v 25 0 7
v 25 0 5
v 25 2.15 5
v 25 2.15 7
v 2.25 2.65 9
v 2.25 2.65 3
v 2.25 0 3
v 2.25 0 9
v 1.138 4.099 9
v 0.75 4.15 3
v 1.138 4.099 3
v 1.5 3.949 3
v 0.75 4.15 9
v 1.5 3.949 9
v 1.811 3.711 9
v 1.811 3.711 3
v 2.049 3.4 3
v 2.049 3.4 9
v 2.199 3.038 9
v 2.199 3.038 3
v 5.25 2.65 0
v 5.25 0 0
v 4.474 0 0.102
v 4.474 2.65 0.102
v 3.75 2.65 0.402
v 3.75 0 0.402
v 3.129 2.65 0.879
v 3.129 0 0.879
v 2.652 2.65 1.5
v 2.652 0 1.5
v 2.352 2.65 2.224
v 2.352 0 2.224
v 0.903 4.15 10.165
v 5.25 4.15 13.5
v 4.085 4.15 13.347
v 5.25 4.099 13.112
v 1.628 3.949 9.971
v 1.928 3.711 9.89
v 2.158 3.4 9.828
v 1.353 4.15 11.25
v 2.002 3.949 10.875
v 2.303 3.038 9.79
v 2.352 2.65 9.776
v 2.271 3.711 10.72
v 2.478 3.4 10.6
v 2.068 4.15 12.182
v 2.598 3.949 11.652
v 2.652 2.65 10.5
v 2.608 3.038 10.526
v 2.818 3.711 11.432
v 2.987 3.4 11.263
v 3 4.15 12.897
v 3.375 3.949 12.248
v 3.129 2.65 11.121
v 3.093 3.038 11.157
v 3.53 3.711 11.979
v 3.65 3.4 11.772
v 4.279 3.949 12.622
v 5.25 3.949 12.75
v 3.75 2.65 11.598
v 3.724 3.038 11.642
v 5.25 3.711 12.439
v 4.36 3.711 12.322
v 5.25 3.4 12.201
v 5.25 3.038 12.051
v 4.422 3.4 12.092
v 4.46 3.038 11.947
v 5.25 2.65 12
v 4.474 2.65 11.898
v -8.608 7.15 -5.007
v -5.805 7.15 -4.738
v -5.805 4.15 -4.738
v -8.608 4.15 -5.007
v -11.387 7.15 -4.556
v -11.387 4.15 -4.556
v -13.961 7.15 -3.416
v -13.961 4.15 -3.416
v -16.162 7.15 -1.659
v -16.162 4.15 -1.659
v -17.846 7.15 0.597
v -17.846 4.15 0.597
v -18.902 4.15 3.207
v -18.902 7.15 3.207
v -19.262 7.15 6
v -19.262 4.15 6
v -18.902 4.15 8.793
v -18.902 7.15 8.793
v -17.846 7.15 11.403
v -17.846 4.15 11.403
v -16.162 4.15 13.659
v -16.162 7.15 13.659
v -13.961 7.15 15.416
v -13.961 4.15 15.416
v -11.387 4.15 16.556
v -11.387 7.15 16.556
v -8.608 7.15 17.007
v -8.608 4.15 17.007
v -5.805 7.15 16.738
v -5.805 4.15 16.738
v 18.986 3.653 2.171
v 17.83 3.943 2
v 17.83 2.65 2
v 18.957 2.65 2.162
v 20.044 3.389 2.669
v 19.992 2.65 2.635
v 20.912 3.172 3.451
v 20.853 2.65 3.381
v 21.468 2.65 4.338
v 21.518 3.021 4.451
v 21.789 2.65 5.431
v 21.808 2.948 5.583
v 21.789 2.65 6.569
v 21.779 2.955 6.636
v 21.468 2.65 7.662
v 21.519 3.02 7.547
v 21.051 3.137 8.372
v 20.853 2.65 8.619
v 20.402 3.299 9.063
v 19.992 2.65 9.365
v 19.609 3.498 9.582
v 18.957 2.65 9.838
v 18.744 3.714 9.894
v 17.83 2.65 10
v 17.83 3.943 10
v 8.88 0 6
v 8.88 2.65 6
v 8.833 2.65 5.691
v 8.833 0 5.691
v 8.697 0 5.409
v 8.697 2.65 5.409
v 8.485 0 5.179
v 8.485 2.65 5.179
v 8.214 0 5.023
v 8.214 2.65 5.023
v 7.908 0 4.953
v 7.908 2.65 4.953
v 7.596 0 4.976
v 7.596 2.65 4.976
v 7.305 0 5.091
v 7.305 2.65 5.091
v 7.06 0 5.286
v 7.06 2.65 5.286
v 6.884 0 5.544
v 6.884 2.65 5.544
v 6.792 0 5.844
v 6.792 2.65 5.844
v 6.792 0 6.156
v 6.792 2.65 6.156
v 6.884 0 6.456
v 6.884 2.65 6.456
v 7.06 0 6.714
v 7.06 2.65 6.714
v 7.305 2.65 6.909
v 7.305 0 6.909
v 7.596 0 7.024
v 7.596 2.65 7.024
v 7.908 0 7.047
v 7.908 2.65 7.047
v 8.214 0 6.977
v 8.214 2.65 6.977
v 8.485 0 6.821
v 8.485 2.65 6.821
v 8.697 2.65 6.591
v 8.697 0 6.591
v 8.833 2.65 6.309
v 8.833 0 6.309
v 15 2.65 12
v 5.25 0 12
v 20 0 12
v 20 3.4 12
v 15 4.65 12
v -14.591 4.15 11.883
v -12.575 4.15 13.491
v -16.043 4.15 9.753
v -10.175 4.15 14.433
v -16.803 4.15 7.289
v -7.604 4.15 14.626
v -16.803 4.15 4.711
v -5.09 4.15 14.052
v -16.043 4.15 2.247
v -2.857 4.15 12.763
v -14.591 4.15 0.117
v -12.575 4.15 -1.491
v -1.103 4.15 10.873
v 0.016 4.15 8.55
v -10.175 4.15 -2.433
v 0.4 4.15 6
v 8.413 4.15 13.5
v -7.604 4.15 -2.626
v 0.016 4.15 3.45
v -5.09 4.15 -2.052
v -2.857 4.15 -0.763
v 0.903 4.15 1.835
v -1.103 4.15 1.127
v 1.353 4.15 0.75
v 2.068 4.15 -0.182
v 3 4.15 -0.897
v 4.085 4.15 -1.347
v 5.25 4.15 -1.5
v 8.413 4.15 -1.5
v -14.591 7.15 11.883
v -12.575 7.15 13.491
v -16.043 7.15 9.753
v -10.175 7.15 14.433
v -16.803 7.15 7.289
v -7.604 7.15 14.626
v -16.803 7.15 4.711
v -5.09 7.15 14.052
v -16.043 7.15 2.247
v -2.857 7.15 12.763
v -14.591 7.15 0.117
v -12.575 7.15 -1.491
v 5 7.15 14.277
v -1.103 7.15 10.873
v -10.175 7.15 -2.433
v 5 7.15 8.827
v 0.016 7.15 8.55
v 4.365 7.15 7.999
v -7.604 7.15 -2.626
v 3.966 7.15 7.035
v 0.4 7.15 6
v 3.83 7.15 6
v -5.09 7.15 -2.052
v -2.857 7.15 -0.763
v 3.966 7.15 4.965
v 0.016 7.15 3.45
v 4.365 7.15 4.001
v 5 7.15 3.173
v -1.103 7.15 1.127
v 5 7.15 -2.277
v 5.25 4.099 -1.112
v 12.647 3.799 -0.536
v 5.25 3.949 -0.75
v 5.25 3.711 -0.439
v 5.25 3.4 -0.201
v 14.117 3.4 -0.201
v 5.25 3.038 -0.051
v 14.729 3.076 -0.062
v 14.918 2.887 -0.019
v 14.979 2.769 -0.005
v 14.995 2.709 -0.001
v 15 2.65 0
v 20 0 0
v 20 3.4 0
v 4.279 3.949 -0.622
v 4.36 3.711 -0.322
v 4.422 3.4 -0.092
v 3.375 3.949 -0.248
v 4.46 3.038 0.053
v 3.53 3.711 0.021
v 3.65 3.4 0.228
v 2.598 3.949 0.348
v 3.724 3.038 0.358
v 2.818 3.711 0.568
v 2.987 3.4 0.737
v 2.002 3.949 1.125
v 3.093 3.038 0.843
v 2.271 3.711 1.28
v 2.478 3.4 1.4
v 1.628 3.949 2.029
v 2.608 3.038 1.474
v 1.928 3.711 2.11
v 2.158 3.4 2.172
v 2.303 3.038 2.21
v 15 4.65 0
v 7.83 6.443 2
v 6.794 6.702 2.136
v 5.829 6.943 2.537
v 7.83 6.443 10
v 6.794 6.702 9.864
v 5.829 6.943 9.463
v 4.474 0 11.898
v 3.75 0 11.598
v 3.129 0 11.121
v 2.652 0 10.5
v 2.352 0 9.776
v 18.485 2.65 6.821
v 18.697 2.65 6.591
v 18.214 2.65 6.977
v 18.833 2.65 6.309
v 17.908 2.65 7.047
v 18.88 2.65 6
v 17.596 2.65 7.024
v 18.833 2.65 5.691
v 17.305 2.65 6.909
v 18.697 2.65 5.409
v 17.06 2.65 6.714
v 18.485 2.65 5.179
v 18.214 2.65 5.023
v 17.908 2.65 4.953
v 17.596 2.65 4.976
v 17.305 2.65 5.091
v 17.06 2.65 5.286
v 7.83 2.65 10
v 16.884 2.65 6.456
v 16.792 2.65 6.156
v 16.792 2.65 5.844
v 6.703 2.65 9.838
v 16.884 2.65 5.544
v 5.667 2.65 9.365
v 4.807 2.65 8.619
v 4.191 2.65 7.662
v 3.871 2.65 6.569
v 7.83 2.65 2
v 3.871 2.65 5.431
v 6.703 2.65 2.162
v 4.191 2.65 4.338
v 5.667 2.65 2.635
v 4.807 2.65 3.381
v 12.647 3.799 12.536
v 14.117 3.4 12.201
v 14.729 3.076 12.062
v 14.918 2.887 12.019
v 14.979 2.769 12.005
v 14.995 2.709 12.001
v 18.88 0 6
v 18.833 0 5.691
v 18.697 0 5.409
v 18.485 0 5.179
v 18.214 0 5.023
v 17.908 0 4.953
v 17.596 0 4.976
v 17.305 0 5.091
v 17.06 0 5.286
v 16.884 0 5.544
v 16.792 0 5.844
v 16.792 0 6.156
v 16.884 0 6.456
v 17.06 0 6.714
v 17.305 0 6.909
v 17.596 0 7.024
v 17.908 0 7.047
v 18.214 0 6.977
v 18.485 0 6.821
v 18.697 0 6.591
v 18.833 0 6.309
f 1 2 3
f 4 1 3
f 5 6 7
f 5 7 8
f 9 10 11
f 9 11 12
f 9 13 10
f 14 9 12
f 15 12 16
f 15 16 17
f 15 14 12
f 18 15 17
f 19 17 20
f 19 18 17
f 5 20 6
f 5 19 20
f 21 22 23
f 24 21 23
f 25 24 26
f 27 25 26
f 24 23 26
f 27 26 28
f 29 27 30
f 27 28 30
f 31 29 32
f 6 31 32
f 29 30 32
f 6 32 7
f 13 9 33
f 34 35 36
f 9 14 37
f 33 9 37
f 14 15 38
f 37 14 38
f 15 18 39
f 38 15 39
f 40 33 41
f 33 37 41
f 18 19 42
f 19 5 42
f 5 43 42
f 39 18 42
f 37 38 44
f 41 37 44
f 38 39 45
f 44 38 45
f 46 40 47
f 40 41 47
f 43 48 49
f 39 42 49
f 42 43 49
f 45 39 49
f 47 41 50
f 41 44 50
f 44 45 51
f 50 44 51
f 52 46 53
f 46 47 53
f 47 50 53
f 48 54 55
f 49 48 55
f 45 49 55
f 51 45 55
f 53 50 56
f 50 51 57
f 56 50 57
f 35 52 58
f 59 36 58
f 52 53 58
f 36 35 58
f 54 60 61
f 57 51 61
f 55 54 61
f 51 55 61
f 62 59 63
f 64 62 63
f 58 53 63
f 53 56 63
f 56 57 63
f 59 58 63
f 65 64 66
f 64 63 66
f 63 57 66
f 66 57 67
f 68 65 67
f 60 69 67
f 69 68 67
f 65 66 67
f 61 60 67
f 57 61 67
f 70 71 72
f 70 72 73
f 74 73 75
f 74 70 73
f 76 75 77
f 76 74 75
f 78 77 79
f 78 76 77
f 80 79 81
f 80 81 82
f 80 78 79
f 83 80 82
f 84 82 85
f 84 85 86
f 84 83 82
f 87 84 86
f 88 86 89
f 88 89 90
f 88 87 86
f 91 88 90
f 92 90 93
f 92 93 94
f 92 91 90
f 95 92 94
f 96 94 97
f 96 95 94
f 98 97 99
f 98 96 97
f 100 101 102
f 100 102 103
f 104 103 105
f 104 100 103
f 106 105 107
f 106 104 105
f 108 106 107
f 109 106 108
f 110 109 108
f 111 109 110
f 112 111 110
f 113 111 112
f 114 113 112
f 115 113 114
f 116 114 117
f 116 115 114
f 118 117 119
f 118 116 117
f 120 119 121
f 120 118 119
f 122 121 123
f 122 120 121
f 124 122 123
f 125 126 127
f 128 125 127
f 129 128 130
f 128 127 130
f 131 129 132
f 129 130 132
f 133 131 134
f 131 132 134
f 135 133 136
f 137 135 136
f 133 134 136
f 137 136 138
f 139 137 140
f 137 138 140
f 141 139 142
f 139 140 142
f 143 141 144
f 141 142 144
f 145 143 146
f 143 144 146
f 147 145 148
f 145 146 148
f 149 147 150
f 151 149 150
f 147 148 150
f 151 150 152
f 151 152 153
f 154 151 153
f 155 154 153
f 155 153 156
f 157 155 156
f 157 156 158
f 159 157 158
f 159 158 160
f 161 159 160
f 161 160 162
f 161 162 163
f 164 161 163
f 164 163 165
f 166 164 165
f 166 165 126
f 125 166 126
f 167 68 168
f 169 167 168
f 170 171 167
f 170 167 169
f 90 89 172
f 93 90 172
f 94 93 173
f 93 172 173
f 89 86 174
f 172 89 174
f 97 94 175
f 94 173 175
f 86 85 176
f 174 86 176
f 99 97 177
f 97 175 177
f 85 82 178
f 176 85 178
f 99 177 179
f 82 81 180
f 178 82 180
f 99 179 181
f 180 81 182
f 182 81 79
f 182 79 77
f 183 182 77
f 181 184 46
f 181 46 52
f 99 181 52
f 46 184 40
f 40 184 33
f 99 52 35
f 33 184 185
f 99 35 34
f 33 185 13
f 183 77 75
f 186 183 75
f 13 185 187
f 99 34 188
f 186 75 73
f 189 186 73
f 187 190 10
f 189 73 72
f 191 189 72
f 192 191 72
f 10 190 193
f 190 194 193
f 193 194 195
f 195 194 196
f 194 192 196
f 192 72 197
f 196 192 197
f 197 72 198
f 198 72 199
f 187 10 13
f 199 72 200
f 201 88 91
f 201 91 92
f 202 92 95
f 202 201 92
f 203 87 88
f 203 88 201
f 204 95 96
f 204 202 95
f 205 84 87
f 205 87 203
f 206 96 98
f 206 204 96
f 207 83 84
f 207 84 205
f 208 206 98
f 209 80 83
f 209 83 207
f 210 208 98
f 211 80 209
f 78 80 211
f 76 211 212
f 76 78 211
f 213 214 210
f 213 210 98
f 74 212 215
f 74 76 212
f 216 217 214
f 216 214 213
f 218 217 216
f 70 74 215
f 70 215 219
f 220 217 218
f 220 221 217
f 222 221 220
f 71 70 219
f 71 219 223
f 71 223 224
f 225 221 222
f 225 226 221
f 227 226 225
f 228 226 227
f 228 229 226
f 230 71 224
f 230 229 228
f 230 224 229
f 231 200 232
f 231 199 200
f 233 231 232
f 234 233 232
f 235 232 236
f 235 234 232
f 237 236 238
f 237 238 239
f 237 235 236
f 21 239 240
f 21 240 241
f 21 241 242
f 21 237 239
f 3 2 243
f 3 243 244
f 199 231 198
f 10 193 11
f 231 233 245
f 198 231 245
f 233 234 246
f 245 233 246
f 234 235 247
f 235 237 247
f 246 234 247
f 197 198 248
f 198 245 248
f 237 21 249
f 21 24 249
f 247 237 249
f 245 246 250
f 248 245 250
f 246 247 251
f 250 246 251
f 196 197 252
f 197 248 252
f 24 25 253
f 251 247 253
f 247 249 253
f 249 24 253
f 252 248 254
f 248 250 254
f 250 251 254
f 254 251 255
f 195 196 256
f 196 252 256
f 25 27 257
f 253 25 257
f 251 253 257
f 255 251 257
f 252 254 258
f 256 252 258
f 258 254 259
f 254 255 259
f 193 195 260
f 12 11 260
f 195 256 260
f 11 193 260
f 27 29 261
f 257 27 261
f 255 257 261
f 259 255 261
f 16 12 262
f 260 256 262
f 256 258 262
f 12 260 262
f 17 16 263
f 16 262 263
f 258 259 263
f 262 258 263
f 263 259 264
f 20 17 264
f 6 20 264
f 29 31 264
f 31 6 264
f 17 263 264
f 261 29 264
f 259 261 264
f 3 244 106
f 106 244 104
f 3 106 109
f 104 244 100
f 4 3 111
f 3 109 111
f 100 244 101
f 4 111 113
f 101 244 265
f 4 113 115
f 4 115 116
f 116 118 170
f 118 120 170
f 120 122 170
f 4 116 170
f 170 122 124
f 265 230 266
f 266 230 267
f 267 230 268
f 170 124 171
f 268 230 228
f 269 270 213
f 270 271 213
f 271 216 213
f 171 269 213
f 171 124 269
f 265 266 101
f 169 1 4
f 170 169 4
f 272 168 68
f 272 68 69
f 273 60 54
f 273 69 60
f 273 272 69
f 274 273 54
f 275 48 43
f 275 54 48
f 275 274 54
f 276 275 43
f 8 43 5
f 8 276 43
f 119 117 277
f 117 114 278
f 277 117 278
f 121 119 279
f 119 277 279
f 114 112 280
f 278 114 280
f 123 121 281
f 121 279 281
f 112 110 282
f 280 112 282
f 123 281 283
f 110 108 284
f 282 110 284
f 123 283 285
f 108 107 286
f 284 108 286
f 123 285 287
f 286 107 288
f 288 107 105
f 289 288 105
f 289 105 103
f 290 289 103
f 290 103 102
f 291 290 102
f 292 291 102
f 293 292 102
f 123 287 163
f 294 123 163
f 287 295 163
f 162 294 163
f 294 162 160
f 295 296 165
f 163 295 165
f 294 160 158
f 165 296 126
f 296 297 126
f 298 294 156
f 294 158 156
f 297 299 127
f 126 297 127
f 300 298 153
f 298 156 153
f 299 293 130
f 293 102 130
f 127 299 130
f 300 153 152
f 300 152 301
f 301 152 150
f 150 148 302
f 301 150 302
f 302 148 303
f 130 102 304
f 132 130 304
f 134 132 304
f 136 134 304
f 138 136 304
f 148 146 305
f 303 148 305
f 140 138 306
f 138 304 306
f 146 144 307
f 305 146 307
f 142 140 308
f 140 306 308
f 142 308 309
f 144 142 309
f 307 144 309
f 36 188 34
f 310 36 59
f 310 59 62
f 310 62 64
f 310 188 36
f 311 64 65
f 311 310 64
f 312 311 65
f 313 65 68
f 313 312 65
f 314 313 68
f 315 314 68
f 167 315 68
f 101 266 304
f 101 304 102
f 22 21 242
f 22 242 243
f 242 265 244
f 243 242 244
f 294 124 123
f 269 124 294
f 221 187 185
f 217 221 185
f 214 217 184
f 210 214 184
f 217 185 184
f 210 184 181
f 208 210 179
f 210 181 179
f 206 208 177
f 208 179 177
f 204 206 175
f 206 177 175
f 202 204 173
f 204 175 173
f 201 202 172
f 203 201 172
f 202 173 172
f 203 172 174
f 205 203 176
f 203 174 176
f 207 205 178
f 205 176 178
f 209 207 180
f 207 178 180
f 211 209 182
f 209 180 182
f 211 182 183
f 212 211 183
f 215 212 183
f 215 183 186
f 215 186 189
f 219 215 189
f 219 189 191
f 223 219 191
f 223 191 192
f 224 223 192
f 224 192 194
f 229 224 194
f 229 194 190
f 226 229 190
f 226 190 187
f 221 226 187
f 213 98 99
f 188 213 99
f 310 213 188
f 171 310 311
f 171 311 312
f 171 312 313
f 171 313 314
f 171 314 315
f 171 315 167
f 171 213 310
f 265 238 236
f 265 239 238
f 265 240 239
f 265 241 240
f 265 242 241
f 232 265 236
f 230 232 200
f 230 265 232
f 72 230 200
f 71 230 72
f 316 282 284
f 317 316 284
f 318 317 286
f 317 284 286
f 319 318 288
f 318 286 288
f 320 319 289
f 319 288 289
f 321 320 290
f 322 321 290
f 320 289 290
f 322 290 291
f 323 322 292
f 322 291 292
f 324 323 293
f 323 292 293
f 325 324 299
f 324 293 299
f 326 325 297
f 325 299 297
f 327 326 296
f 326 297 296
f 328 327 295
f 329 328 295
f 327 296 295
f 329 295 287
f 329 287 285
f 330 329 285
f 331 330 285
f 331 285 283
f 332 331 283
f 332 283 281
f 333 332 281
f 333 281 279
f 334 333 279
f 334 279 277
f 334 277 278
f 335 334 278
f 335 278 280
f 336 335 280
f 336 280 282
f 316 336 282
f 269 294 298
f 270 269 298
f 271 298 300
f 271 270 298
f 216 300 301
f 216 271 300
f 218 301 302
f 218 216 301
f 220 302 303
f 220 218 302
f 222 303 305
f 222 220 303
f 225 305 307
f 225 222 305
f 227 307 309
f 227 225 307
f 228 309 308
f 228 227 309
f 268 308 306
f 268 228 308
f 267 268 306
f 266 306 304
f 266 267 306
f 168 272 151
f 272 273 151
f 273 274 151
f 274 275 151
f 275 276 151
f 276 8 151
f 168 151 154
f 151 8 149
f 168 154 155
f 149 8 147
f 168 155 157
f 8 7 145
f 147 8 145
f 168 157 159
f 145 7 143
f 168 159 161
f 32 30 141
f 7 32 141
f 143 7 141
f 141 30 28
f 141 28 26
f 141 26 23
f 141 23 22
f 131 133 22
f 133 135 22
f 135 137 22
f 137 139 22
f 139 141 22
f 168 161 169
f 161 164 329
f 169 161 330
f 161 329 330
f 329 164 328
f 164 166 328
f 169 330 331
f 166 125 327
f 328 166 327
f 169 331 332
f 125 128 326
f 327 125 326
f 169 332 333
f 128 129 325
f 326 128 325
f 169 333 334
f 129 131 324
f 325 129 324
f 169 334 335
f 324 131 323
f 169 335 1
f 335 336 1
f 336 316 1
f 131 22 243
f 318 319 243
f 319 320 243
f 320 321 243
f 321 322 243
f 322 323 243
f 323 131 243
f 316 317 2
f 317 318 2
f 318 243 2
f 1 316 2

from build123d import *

# Parameters (mm, degrees)
SKETCH1_W           = 25
SKETCH1_H           = 7.15
BOSS_EXTRUDE1_DEPTH = 12
BOSS_EXTRUDE2_DEPTH = 3
CUT_EXTRUDE1_DEPTH  = 21
SKETCH4_R           = 8.65
CUT_EXTRUDE2_DEPTH  = 10
CHAMFER1_SIZE       = 5
CHAMFER1_SIZE2      = 20
CHAMFER2_SIZE       = 5
SKETCH6_R           = 1.05
CUT_EXTRUDE3_DEPTH  = 10
CUT_EXTRUDE4_DEPTH  = 4.5
FILLET1_R           = 3
FILLET2_R           = 1.5


with BuildPart() as part:
    # Sketch1 → Boss-Extrude1 (new body)
    with BuildSketch(Plane.XY):
        with Locations((12.5, 3.575)):
            Rectangle(SKETCH1_W, SKETCH1_H)
    extrude(amount=BOSS_EXTRUDE1_DEPTH)

    # Sketch2 → Boss-Extrude2 (add)
    with BuildSketch(Plane(origin=(0, 7.15, 0), x_dir=(1, 0, 0), z_dir=(0, 1, 0))):
        with BuildLine():
            Line((15, -12), (15, -6))
            Line((15, -6), (15, 0))
            Line((15, 0), (-5.804949202, 4.737516245))
            ThreePointArc((-5.804949202, 4.737516245), (-19.262380692, -6), (-5.804949202, -16.737516245))
            Line((-5.804949202, -16.737516245), (15, -12))
        make_face()
    extrude(amount=-BOSS_EXTRUDE2_DEPTH)

    # Sketch3 → Cut-Extrude1 (cut)
    with BuildSketch(Plane.XZ.offset(-4.15)):
        Polygon((2.25, 6), (2.25, 12), (0, 12), (0, 0), (2.25, 0), align=None)
    extrude(amount=CUT_EXTRUDE1_DEPTH, mode=Mode.SUBTRACT)

    # Sketch4 → Cut-Extrude2 (cut)
    with BuildSketch(Plane.XZ.offset(-4.15)):
        with Locations((-8.25, 6)):
            Circle(SKETCH4_R)
    extrude(amount=-CUT_EXTRUDE2_DEPTH, mode=Mode.SUBTRACT)

    # Chamfer1
    chamfer1_edges = [part.edges().sort_by_distance(p)[0] for p in [
        (25, 7.15, 6),
    ]]
    chamfer1_side = [part.faces().sort_by_distance(p)[0] for p in [
        (25, 3.575, 6),
    ]]
    chamfer(chamfer1_edges, length=CHAMFER1_SIZE, length2=CHAMFER1_SIZE2, reference=chamfer1_side[0])

    # Chamfer2
    chamfer2_edges = [part.edges().sort_by_distance(p)[0] for p in [
        (25, 1.075, 0),
        (25, 1.075, 12),
    ]]
    chamfer(chamfer2_edges, length=CHAMFER2_SIZE)

    # Sketch6 → Cut-Extrude3 (cut)
    with BuildSketch(Plane(origin=(0, 7.15, 0), x_dir=(1, 0, 0), z_dir=(0, 1, 0))):
        with Locations((7.829893366, -6)):
            Circle(SKETCH6_R)
        with Locations((17.829893366, -6)):
            Circle(SKETCH6_R)
    extrude(amount=-CUT_EXTRUDE3_DEPTH, mode=Mode.SUBTRACT)

    # Sketch7 → Cut-Extrude4 (cut)
    with BuildSketch(Plane(origin=(0, 7.15, 0), x_dir=(1, 0, 0), z_dir=(0, 1, 0))):
        with BuildLine():
            Line((7.829893366, -2), (17.829893366, -2))
            ThreePointArc((17.829893366, -2), (21.829893366, -6), (17.829893366, -10))
            Line((17.829893366, -10), (7.829893366, -10))
            ThreePointArc((7.829893366, -10), (3.829893366, -6), (7.829893366, -2))
        make_face()
    extrude(amount=-CUT_EXTRUDE4_DEPTH, mode=Mode.SUBTRACT)

    # Fillet1
    fillet1_edges = [part.edges().sort_by_distance(p)[0] for p in [
        (2.25, 2.075, 0),
        (2.25, 2.075, 12),
    ]]
    fillet(fillet1_edges, radius=FILLET1_R)

    # Fillet2
    fillet2_edges = [part.edges().sort_by_distance(p)[0] for p in [
        (2.25, 4.15, 6),
        (10.125, 4.15, 12),
        (3.128679656, 4.15, 11.121320344),
        (3.128679656, 4.15, 0.878679656),
        (10.125, 4.15, 0),
    ]]
    fillet(fillet2_edges, radius=FILLET2_R)


solid = part.part
